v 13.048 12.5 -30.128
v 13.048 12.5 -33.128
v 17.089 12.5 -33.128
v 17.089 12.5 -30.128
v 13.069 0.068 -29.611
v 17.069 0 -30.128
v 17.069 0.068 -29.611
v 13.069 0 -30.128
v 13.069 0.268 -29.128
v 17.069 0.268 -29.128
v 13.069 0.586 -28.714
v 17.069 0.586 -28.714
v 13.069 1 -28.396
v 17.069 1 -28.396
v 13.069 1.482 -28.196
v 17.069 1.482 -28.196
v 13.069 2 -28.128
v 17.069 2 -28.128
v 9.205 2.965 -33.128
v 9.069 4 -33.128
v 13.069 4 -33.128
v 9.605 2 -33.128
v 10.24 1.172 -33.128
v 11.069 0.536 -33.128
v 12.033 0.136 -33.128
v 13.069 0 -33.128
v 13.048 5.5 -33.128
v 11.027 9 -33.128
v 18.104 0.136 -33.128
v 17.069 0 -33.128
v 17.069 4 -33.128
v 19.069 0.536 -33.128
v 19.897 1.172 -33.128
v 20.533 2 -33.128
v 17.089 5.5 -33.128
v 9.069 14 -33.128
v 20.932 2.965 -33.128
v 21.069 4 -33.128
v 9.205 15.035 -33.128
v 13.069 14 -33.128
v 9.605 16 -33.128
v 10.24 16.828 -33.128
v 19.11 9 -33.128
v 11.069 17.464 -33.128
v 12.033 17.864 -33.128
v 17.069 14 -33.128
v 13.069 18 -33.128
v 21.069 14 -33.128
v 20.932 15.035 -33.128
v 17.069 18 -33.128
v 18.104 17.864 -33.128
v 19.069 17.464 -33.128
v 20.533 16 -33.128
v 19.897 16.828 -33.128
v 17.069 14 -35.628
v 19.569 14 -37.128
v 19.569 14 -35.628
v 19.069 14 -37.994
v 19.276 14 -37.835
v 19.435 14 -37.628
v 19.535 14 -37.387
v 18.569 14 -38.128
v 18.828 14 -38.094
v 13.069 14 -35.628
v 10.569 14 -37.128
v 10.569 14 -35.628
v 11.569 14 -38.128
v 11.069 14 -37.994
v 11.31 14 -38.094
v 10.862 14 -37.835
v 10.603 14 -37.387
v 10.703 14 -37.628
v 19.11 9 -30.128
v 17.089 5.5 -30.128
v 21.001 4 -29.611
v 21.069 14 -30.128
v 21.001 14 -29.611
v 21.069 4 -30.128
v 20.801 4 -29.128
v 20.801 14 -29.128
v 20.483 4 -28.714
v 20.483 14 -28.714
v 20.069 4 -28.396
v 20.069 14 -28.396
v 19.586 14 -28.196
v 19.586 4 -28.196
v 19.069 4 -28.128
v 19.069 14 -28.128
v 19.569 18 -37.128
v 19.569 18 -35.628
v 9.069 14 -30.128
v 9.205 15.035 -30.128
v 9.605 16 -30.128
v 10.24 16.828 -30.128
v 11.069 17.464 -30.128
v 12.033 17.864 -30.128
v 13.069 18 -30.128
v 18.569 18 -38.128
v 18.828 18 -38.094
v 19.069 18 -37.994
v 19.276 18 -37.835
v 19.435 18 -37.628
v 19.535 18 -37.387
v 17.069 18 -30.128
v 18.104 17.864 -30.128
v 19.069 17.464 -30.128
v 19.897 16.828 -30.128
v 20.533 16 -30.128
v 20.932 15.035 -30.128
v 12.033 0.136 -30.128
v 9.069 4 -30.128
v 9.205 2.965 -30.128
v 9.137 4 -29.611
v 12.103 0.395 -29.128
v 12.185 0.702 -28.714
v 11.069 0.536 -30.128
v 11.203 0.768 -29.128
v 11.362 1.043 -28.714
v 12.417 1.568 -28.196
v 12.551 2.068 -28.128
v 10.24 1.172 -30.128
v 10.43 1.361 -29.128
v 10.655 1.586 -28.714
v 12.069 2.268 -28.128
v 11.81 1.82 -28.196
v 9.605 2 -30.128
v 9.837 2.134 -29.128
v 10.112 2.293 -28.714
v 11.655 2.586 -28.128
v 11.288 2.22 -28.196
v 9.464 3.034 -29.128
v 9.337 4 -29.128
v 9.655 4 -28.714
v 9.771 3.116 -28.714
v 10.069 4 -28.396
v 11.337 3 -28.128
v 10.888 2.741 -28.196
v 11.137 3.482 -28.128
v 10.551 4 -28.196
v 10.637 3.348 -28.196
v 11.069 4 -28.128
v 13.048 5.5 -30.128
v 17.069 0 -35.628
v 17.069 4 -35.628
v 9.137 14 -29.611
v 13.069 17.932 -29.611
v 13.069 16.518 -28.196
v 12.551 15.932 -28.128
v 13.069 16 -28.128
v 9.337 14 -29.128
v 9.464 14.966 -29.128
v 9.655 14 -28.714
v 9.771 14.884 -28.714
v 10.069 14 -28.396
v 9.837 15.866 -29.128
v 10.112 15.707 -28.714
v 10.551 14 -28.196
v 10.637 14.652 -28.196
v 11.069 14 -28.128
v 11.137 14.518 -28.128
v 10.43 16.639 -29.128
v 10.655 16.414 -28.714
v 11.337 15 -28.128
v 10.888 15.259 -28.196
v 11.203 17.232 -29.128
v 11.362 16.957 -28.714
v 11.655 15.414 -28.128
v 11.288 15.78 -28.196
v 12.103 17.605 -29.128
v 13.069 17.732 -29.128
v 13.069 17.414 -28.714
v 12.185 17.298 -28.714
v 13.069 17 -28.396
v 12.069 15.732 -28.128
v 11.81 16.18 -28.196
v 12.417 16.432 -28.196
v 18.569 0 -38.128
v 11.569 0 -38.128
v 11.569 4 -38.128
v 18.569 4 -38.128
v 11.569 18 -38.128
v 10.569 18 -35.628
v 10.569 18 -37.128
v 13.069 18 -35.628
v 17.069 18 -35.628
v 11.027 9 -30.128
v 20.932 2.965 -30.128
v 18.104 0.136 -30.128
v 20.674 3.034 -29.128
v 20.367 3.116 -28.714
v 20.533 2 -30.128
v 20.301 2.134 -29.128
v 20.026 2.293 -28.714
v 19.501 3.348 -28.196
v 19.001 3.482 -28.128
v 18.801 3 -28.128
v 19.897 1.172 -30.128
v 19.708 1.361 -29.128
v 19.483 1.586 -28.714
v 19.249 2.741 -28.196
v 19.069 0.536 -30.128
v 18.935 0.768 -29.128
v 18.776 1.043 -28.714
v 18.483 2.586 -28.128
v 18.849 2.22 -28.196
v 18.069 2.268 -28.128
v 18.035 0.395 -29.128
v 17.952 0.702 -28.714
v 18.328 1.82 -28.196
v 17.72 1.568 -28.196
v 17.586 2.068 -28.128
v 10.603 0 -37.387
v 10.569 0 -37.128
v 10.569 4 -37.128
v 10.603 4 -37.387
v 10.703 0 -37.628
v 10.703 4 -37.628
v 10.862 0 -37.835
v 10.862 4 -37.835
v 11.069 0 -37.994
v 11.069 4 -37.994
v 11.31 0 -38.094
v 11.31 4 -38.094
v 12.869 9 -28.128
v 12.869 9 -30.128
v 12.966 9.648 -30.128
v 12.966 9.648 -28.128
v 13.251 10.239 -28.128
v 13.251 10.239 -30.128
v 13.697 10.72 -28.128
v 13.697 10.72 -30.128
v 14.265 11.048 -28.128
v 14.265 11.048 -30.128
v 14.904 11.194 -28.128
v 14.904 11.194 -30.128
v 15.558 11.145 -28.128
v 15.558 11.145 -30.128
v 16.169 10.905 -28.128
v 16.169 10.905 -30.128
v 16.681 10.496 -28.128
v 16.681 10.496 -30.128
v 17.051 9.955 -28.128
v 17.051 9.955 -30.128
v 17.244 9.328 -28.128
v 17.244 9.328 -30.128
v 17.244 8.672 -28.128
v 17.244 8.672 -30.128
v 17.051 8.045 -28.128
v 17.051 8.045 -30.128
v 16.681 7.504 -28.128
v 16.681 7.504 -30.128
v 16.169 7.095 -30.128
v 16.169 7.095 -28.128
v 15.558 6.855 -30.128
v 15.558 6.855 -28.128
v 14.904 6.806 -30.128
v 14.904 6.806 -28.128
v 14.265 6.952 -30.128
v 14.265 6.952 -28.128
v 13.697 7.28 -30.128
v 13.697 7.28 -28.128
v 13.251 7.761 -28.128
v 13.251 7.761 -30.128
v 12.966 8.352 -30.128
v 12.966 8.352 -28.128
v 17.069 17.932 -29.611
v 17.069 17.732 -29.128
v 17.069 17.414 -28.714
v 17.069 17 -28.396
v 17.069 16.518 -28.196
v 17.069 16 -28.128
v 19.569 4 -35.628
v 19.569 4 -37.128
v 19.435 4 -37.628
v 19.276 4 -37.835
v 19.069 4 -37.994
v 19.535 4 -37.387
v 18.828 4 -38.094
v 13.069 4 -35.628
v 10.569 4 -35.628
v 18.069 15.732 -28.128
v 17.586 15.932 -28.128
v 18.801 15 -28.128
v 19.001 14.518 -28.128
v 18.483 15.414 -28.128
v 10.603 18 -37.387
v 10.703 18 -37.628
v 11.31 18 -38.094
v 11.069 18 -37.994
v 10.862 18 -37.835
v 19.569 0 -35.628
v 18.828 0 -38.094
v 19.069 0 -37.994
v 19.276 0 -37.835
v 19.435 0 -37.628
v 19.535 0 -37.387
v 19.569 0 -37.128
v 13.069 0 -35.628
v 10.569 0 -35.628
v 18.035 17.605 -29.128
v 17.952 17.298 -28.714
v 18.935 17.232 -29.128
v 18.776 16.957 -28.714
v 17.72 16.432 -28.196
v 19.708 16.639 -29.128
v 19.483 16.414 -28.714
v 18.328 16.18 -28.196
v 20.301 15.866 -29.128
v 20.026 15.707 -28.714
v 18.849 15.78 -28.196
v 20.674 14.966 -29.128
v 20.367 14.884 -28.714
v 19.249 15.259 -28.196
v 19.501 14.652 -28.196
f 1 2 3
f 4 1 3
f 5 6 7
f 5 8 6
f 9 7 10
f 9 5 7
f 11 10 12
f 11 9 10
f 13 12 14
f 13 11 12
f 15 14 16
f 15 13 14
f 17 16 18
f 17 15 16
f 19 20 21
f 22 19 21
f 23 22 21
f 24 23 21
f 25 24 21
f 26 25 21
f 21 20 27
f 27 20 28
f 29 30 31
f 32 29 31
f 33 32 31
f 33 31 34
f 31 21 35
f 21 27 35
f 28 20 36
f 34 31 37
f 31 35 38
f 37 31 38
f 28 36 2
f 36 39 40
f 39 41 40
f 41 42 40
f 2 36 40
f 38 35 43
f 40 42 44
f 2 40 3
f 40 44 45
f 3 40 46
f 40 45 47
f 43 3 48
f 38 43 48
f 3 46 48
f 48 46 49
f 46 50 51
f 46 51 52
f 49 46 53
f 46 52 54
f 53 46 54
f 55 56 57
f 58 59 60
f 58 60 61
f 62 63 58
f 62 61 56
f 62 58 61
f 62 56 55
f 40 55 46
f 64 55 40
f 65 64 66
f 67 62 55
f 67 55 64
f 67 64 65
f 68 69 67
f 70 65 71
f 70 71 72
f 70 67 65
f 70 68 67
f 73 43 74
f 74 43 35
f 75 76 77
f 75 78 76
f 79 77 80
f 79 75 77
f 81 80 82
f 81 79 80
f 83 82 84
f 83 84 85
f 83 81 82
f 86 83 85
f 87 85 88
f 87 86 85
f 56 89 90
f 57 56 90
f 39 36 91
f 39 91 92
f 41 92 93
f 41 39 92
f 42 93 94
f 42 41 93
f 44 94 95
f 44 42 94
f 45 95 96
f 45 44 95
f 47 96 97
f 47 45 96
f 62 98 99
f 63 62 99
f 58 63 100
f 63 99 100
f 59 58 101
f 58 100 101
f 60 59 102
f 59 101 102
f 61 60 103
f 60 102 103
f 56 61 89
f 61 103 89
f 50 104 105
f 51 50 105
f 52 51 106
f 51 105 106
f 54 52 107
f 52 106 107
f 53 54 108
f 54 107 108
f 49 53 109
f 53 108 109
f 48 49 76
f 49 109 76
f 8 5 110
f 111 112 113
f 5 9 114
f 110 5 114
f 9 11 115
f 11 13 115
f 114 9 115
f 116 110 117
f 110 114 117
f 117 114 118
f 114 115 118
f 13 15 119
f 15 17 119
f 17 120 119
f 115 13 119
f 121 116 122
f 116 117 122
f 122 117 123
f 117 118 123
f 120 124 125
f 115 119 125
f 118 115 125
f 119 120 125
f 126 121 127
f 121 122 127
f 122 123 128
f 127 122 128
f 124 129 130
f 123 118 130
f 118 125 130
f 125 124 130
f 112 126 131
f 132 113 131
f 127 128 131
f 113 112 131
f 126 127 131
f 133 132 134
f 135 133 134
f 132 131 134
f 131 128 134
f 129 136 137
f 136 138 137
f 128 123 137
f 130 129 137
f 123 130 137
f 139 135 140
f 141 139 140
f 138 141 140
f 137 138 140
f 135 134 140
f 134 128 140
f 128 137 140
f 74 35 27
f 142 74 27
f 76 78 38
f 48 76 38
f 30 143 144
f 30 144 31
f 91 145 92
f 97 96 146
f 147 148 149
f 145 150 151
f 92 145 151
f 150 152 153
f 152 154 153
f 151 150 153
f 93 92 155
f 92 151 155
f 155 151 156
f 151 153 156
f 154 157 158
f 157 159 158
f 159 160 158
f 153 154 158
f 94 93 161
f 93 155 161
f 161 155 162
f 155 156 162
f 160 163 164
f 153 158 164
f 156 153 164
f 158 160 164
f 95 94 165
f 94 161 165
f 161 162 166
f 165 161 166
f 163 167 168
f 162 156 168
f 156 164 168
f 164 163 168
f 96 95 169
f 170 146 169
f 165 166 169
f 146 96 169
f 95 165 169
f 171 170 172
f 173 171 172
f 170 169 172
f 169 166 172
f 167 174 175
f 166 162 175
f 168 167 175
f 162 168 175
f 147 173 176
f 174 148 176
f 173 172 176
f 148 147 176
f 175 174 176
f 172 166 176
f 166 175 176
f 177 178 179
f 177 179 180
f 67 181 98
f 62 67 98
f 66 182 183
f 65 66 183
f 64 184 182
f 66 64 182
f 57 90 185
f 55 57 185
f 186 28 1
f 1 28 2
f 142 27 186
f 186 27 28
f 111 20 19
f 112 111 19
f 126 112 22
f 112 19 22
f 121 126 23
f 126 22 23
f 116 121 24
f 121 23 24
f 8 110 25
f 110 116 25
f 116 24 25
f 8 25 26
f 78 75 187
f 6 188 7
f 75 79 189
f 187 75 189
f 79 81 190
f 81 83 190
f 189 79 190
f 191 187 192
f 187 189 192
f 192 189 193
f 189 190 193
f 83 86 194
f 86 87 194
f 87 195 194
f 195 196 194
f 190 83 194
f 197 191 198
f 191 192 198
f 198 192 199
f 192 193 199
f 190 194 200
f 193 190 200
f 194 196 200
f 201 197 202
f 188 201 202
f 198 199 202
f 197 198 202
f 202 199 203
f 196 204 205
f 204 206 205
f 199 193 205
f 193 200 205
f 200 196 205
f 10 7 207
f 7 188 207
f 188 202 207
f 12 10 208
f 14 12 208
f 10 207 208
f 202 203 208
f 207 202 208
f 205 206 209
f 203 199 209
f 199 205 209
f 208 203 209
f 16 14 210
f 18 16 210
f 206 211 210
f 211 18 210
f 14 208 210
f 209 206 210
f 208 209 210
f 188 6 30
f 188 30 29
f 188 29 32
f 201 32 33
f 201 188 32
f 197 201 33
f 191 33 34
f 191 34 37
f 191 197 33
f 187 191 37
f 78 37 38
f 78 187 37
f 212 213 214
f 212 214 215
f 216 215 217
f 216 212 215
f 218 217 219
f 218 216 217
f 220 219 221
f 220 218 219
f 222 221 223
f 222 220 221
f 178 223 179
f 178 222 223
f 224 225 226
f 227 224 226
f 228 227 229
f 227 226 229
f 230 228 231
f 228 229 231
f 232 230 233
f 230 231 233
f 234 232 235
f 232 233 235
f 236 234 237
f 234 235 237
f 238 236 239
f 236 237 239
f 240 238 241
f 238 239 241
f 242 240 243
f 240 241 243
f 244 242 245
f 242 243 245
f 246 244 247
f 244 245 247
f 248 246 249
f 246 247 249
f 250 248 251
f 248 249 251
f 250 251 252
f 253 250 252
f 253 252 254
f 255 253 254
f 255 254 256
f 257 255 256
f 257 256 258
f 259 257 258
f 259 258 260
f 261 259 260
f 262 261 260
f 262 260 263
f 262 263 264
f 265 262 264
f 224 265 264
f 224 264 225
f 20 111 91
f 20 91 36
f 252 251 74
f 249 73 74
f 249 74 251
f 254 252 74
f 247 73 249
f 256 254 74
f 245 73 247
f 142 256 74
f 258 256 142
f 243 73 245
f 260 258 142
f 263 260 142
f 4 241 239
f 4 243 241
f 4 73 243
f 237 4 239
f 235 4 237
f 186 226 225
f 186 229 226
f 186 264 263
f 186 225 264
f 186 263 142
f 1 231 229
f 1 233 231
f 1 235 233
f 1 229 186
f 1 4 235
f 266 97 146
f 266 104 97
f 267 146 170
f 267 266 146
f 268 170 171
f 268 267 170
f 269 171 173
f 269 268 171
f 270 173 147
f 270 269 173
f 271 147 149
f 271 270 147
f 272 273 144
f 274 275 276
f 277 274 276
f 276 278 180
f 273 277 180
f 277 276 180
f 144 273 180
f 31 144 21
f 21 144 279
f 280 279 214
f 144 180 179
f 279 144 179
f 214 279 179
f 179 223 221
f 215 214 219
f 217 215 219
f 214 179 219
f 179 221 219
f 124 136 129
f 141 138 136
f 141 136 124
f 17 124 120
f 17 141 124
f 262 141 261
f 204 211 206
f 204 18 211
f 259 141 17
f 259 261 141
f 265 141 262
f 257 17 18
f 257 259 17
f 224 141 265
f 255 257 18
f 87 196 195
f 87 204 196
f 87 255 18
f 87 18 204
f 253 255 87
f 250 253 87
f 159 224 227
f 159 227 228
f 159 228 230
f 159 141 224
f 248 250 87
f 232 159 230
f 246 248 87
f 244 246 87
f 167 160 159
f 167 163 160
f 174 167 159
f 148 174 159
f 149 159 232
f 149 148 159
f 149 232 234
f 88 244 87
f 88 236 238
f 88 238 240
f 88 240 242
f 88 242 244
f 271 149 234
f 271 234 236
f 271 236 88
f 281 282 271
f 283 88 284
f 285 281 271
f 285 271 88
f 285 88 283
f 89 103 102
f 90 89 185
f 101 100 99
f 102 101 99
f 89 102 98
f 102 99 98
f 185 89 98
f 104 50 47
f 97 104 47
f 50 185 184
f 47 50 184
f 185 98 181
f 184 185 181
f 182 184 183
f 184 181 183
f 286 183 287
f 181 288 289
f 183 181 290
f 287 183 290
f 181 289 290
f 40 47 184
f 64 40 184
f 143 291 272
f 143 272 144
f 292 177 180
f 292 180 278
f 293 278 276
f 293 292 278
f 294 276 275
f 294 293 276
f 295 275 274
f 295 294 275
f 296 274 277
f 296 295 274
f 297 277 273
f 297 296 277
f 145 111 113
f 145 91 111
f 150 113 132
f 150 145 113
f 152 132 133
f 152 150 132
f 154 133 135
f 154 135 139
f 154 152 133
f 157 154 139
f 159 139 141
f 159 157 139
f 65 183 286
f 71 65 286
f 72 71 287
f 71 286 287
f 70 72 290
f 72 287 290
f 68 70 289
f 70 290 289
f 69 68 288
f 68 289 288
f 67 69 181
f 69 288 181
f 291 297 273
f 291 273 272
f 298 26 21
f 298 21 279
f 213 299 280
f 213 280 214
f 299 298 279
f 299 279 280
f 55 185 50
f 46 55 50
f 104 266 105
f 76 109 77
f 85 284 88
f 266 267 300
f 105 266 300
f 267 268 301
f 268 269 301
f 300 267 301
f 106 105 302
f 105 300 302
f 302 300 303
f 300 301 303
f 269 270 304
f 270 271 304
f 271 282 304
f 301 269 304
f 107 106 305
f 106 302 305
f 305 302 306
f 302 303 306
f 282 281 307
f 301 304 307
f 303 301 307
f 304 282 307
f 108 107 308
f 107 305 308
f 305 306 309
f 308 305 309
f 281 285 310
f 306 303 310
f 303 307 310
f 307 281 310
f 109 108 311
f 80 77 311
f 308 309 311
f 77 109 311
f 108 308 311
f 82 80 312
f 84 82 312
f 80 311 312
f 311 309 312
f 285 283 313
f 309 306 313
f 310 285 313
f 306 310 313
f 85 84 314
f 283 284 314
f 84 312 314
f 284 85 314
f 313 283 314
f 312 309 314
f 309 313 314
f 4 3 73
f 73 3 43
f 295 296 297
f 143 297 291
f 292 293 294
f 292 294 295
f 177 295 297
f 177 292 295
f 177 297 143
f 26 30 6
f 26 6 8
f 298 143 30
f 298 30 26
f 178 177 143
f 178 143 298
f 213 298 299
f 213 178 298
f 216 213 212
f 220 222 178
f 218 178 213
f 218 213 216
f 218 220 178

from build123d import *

# Parameters (mm, degrees)
BOSS_EXTRU_3_DEPTH      = 4
ESQUISSE3_W             = 12
ESQUISSE3_H             = 5
BOSS_EXTRU_4_DEPTH      = 5
ENL_V_MAT_EXTRU_1_REACH = 7
ESQUISSE4_R             = 2.2
ENL_V_MAT_EXTRU_2_DEPTH = 3
CONG_1_R                = 4
CONG_2_R                = 2


with BuildPart() as part:
    # Esquisse2 → Boss.-Extru.3 (new body)
    with BuildSketch(Plane(origin=(0, 0, 0), x_dir=(1, 0, 0), z_dir=(0, 1, 0))):
        with BuildLine():
            Line((11.568725398, 38.128215269), (18.568725398, 38.128215269))
            ThreePointArc((18.568725398, 38.128215269), (19.275832179, 37.83532205), (19.568725398, 37.128215269))
            Line((19.568725398, 37.128215269), (19.568725398, 35.628215269))
            Line((19.568725398, 35.628215269), (17.068725398, 35.628215269))
            Line((17.068725398, 35.628215269), (17.068725398, 33.128215269))
            Line((17.068725398, 33.128215269), (21.068725398, 33.128215269))
            Line((21.068725398, 33.128215269), (21.068725398, 28.128215269))
            Line((21.068725398, 28.128215269), (9.068725398, 28.128215269))
            Line((9.068725398, 28.128215269), (9.068725398, 33.128215269))
            Line((9.068725398, 33.128215269), (13.068725398, 33.128215269))
            Line((13.068725398, 33.128215269), (13.068725398, 35.628215269))
            Line((13.068725398, 35.628215269), (10.568725398, 35.628215269))
            Line((10.568725398, 35.628215269), (10.568725398, 37.128215269))
            ThreePointArc((10.568725398, 37.128215269), (10.861618616, 37.83532205), (11.568725398, 38.128215269))
        make_face()
    extrude(amount=BOSS_EXTRU_3_DEPTH)

    # Esquisse3 → Boss.-Extru.4 (add)
    with BuildSketch(Plane(origin=(0, 4, 0), x_dir=(1, 0, 0), z_dir=(0, 1, 0))):
        with Locations((15.068725398, 30.628215269)):
            Rectangle(ESQUISSE3_W, ESQUISSE3_H)
    extrude(amount=BOSS_EXTRU_4_DEPTH)

    # Symétrie1: part across plane


with BuildPart() as part_1:
    add(part.part)
    add(part.part.mirror(Plane.ZX.offset(9)))

    # Esquisse4 → Enlèv. mat.-Extru.1 (cut, up to next)
    with BuildSketch(Plane(origin=(0, 0, -33.128215269), x_dir=(-1, 0, 0), z_dir=(0, 0, -1)), mode=Mode.PRIVATE) as enl_v_mat_extru_1_sk1:
        with Locations((-15.068725398, 9)):
            Circle(ESQUISSE4_R)
    enl_v_mat_extru_1_tool1 = extrude(enl_v_mat_extru_1_sk1.sketch, amount=-ENL_V_MAT_EXTRU_1_REACH, mode=Mode.PRIVATE) & part_1.part
    add(enl_v_mat_extru_1_tool1.solids().sort_by_distance((15.068725, 9, -33.128215))[0], mode=Mode.SUBTRACT)

    # Esquisse5 → Enlèv. mat.-Extru.2 (cut)
    with BuildSketch(Plane(origin=(0, 0, -33.128215269), x_dir=(-1, 0, 0), z_dir=(0, 0, -1))):
        Polygon((-13.047999455, 12.5), (-17.08945134, 12.5), (-19.110177282, 9), (-17.08945134, 5.5), (-13.047999455, 5.5), (-11.027273513, 9), align=None)
    extrude(amount=-ENL_V_MAT_EXTRU_2_DEPTH, mode=Mode.SUBTRACT)

    # Congé1
    cong_1_edges = [part_1.edges().sort_by_distance(p)[0] for p in [
        (9.068725398, 0, -30.628215269),
        (9.068725398, 18, -30.628215269),
        (21.068725398, 18, -30.628215269),
        (21.068725398, 0, -30.628215269),
    ]]
    fillet(cong_1_edges, radius=CONG_1_R)

    # Congé2
    cong_2_edges = [part_1.edges().sort_by_distance(p)[0] for p in [
        (9.068725398, 9, -28.128215269),
        (15.068725398, 0, -28.128215269),
        (21.068725398, 9, -28.128215269),
        (15.068725398, 18, -28.128215269),
        (19.897152522, 16.828427125, -28.128215269),
        (19.897152522, 1.171572875, -28.128215269),
        (10.240298273, 16.828427125, -28.128215269),
        (10.240298273, 1.171572875, -28.128215269),
    ]]
    fillet(cong_2_edges, radius=CONG_2_R)


solid = part_1.part
